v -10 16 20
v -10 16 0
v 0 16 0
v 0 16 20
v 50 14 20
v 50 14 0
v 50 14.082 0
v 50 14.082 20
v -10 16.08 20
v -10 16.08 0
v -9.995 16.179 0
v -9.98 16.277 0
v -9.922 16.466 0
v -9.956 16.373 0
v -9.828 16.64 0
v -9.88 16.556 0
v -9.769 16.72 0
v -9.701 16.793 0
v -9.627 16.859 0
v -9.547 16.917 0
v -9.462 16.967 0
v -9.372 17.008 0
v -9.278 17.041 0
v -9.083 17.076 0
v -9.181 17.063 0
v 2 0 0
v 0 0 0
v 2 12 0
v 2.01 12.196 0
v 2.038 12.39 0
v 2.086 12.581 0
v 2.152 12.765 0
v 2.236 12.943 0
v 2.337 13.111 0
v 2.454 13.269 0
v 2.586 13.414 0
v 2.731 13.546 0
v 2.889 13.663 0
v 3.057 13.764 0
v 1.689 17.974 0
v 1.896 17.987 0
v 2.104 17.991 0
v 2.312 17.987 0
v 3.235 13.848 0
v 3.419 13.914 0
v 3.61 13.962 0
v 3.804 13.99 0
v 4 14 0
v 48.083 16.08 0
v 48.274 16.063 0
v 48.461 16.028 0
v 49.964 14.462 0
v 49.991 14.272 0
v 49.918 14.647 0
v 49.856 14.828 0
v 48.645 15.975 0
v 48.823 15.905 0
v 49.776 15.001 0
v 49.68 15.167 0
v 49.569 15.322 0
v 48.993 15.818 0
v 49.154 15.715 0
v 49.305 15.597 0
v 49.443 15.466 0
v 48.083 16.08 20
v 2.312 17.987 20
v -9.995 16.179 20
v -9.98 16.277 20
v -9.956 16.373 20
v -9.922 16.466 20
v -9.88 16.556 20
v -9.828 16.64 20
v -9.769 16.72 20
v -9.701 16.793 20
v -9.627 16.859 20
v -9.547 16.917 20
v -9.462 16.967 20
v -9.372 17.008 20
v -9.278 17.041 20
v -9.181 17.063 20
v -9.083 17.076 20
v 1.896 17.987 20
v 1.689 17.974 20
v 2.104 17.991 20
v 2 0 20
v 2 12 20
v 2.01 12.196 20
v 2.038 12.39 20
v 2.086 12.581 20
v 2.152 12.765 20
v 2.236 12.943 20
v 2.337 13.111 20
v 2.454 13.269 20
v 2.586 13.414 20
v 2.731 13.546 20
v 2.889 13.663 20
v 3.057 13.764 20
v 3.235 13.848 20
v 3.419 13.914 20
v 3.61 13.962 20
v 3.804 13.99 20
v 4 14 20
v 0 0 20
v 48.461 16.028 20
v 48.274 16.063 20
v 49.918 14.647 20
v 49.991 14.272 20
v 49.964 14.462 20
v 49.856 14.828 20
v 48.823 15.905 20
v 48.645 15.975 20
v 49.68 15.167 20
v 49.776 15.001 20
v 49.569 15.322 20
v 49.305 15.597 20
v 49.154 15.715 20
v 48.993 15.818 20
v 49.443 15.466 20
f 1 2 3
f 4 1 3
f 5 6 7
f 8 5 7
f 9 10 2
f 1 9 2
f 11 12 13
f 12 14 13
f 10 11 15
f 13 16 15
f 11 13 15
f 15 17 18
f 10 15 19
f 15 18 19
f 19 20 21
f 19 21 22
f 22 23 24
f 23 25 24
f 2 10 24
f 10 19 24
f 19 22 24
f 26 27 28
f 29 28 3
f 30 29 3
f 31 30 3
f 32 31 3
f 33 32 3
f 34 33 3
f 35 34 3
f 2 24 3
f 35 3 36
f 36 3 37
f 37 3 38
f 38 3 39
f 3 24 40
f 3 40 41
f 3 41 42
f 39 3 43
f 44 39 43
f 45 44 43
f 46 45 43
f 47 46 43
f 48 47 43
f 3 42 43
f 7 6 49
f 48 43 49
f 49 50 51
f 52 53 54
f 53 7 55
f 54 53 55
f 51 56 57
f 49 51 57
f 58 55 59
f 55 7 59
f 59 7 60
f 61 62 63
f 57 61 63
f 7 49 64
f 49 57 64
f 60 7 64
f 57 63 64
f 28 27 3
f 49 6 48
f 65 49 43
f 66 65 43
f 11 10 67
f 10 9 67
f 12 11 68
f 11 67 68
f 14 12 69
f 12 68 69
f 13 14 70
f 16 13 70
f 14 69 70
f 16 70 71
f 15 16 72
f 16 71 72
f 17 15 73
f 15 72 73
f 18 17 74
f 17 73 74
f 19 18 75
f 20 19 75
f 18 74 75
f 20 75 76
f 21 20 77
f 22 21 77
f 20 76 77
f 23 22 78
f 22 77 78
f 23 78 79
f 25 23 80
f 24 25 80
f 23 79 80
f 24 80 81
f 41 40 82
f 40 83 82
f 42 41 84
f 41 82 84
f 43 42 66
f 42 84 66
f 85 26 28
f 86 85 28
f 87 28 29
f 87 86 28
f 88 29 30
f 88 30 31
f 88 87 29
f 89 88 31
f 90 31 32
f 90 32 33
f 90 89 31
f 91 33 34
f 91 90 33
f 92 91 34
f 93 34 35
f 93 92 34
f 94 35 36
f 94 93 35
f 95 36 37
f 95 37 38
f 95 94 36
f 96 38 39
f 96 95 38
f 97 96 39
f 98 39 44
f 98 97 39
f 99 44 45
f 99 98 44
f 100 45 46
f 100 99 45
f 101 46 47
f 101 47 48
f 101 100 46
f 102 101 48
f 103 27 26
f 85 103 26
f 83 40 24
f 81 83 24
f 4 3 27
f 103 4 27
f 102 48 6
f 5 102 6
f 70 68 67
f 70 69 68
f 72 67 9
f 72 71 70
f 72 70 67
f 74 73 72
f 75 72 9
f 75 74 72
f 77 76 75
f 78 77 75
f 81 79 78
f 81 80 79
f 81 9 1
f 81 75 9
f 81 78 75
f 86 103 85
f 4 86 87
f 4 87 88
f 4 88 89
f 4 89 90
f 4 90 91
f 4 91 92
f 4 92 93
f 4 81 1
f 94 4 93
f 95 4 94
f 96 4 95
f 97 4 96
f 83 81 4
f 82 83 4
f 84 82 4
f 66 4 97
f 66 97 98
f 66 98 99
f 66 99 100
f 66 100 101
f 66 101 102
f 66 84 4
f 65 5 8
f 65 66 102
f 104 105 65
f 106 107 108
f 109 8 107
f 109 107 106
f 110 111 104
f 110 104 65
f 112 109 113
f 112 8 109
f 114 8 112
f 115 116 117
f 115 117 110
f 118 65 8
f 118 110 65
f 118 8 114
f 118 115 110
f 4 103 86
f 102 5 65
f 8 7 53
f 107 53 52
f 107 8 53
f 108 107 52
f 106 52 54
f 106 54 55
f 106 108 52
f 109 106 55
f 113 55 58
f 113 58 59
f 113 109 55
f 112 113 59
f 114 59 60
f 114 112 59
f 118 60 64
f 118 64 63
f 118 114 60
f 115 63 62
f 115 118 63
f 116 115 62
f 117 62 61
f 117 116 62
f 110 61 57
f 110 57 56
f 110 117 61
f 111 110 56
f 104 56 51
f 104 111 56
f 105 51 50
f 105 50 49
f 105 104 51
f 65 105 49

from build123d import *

# Parameters (mm, degrees)
F1_DEPTH = 20
F2_R     = 2
F3_R     = 1
F4_R     = 5


with BuildPart() as f1:
    # F0 (on Top) → F1 (new body)
    with BuildSketch(Plane.XY):
        Polygon((0, 16), (0, 0), (2, 0), (2, 14), (50, 14), (50, 16), (2, 18), (-10, 17), (-10, 16), align=None)
    extrude(amount=F1_DEPTH)

    # F2
    f2_edges = [f1.edges().sort_by_distance(p)[0] for p in [
        (50, 16, 10),
        (2, 14, 10),
    ]]
    fillet(f2_edges, radius=F2_R)

    # F3
    f3_edges = [f1.edges().sort_by_distance(p)[0] for p in [
        (-10, 17, 10),
    ]]
    fillet(f3_edges, radius=F3_R)

    # F4
    f4_edges = [f1.edges().sort_by_distance(p)[0] for p in [
        (2, 18, 10),
    ]]
    fillet(f4_edges, radius=F4_R)


solid = f1.part
